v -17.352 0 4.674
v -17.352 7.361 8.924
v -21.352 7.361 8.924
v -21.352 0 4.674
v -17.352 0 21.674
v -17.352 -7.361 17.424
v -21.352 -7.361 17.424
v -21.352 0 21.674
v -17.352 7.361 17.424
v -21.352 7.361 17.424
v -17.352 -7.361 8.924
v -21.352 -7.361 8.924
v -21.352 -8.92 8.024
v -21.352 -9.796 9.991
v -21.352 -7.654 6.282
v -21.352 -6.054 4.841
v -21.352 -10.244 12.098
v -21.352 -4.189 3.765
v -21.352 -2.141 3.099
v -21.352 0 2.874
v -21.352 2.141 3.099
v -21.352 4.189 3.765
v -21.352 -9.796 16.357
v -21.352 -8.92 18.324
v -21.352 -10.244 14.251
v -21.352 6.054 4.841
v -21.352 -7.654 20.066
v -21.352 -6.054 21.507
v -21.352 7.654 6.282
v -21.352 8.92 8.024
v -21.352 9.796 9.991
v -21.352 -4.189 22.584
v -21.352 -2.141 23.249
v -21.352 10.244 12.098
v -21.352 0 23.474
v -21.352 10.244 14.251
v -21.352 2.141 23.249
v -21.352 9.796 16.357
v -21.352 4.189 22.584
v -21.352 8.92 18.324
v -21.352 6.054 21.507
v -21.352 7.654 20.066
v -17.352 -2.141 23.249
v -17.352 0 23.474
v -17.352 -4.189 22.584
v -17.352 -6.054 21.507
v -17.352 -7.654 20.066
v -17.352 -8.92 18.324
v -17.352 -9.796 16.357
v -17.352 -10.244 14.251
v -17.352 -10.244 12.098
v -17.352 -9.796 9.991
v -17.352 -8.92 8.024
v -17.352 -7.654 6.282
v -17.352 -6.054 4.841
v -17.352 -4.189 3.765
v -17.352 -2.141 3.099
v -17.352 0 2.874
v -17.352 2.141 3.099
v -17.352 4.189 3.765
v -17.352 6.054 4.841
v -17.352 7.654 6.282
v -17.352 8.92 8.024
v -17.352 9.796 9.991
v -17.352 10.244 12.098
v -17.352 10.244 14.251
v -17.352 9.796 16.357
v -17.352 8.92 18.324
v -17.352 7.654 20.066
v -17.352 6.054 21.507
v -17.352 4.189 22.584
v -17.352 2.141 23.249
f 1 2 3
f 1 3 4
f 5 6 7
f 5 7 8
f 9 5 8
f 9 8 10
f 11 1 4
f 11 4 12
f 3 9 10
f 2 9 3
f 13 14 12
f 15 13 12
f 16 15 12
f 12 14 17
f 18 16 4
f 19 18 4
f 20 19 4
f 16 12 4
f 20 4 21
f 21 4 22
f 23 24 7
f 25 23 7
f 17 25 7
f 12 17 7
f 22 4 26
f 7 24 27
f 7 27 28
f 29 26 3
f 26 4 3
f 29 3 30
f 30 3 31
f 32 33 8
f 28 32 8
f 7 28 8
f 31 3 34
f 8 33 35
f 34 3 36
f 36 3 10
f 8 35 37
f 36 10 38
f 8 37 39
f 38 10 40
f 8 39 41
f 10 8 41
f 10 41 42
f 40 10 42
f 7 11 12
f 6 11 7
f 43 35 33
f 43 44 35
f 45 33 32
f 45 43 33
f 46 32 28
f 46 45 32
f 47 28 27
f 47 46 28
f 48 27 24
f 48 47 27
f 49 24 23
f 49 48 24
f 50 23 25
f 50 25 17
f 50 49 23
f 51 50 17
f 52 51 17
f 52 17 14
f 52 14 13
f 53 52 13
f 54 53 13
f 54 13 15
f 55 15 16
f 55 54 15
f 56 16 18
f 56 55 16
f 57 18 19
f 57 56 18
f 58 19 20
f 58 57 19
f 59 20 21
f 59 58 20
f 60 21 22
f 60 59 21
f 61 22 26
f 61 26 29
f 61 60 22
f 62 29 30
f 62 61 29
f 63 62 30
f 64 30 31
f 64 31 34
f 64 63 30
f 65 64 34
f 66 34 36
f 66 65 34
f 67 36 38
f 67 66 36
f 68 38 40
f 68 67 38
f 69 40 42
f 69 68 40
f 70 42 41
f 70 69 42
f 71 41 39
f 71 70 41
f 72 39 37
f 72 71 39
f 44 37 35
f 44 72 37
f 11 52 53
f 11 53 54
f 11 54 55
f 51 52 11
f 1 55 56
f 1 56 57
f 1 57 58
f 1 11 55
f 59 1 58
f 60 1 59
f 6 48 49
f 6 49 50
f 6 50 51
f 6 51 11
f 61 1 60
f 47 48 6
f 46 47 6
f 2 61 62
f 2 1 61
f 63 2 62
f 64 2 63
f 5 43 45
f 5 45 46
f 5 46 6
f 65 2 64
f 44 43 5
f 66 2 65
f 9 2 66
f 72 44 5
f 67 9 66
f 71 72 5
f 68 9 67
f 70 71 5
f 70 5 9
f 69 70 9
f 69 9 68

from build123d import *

# Parameters (mm, degrees)
F0_W     = 4
F0_H     = 1.8
F3_DEPTH = 4


with BuildPart() as f1:
    # F0 (on Front) → F1 (revolve)
    with BuildSketch(Plane.XZ):
        with Locations((-19.3521137871, 22.5742971626)):
            Rectangle(F0_W, F0_H)
    revolve(axis=Axis((-20.6097164191, 0, 13.1742971626), (1, 0, 0)))

    # F2 (on face) → F3 (join)
    with BuildSketch(Plane.YZ.offset(-17.3521137871)):
        with BuildLine():
            Line((-7.3612159322, 17.4242971626), (0, 21.6742971626))
            ThreePointArc((0, 21.6742971626), (-4.25, 20.5355130948), (-7.3612159322, 17.4242971626))
        make_face()
        with BuildLine():
            Line((-7.3612159322, 8.9242971626), (-7.3612159322, 17.4242971626))
            ThreePointArc((-7.3612159322, 17.4242971626), (-8.5, 13.1742971626), (-7.3612159322, 8.9242971626))
        make_face()
        with BuildLine():
            Line((0, 4.6742971626), (-7.3612159322, 8.9242971626))
            ThreePointArc((-7.3612159322, 8.9242971626), (-4.25, 5.8130812304), (0, 4.6742971626))
        make_face()
        with BuildLine():
            ThreePointArc((0, 4.6742971626), (4.25, 5.8130812304), (7.3612159322, 8.9242971626))
            Line((7.3612159322, 8.9242971626), (0, 4.6742971626))
        make_face()
        with BuildLine():
            ThreePointArc((8.5, 13.1742971626), (8.2103695235, 15.374259046), (7.3612159322, 17.4242971626))
            Line((7.3612159322, 17.4242971626), (7.3612159322, 8.9242971626))
            ThreePointArc((7.3612159322, 8.9242971626), (8.2103695235, 10.9743352792), (8.5, 13.1742971626))
        make_face()
        with BuildLine():
            ThreePointArc((7.3612159322, 17.4242971626), (4.25, 20.5355130948), (0, 21.6742971626))
            Line((0, 21.6742971626), (7.3612159322, 17.4242971626))
        make_face()
    extrude(amount=-F3_DEPTH)


solid = f1.part
